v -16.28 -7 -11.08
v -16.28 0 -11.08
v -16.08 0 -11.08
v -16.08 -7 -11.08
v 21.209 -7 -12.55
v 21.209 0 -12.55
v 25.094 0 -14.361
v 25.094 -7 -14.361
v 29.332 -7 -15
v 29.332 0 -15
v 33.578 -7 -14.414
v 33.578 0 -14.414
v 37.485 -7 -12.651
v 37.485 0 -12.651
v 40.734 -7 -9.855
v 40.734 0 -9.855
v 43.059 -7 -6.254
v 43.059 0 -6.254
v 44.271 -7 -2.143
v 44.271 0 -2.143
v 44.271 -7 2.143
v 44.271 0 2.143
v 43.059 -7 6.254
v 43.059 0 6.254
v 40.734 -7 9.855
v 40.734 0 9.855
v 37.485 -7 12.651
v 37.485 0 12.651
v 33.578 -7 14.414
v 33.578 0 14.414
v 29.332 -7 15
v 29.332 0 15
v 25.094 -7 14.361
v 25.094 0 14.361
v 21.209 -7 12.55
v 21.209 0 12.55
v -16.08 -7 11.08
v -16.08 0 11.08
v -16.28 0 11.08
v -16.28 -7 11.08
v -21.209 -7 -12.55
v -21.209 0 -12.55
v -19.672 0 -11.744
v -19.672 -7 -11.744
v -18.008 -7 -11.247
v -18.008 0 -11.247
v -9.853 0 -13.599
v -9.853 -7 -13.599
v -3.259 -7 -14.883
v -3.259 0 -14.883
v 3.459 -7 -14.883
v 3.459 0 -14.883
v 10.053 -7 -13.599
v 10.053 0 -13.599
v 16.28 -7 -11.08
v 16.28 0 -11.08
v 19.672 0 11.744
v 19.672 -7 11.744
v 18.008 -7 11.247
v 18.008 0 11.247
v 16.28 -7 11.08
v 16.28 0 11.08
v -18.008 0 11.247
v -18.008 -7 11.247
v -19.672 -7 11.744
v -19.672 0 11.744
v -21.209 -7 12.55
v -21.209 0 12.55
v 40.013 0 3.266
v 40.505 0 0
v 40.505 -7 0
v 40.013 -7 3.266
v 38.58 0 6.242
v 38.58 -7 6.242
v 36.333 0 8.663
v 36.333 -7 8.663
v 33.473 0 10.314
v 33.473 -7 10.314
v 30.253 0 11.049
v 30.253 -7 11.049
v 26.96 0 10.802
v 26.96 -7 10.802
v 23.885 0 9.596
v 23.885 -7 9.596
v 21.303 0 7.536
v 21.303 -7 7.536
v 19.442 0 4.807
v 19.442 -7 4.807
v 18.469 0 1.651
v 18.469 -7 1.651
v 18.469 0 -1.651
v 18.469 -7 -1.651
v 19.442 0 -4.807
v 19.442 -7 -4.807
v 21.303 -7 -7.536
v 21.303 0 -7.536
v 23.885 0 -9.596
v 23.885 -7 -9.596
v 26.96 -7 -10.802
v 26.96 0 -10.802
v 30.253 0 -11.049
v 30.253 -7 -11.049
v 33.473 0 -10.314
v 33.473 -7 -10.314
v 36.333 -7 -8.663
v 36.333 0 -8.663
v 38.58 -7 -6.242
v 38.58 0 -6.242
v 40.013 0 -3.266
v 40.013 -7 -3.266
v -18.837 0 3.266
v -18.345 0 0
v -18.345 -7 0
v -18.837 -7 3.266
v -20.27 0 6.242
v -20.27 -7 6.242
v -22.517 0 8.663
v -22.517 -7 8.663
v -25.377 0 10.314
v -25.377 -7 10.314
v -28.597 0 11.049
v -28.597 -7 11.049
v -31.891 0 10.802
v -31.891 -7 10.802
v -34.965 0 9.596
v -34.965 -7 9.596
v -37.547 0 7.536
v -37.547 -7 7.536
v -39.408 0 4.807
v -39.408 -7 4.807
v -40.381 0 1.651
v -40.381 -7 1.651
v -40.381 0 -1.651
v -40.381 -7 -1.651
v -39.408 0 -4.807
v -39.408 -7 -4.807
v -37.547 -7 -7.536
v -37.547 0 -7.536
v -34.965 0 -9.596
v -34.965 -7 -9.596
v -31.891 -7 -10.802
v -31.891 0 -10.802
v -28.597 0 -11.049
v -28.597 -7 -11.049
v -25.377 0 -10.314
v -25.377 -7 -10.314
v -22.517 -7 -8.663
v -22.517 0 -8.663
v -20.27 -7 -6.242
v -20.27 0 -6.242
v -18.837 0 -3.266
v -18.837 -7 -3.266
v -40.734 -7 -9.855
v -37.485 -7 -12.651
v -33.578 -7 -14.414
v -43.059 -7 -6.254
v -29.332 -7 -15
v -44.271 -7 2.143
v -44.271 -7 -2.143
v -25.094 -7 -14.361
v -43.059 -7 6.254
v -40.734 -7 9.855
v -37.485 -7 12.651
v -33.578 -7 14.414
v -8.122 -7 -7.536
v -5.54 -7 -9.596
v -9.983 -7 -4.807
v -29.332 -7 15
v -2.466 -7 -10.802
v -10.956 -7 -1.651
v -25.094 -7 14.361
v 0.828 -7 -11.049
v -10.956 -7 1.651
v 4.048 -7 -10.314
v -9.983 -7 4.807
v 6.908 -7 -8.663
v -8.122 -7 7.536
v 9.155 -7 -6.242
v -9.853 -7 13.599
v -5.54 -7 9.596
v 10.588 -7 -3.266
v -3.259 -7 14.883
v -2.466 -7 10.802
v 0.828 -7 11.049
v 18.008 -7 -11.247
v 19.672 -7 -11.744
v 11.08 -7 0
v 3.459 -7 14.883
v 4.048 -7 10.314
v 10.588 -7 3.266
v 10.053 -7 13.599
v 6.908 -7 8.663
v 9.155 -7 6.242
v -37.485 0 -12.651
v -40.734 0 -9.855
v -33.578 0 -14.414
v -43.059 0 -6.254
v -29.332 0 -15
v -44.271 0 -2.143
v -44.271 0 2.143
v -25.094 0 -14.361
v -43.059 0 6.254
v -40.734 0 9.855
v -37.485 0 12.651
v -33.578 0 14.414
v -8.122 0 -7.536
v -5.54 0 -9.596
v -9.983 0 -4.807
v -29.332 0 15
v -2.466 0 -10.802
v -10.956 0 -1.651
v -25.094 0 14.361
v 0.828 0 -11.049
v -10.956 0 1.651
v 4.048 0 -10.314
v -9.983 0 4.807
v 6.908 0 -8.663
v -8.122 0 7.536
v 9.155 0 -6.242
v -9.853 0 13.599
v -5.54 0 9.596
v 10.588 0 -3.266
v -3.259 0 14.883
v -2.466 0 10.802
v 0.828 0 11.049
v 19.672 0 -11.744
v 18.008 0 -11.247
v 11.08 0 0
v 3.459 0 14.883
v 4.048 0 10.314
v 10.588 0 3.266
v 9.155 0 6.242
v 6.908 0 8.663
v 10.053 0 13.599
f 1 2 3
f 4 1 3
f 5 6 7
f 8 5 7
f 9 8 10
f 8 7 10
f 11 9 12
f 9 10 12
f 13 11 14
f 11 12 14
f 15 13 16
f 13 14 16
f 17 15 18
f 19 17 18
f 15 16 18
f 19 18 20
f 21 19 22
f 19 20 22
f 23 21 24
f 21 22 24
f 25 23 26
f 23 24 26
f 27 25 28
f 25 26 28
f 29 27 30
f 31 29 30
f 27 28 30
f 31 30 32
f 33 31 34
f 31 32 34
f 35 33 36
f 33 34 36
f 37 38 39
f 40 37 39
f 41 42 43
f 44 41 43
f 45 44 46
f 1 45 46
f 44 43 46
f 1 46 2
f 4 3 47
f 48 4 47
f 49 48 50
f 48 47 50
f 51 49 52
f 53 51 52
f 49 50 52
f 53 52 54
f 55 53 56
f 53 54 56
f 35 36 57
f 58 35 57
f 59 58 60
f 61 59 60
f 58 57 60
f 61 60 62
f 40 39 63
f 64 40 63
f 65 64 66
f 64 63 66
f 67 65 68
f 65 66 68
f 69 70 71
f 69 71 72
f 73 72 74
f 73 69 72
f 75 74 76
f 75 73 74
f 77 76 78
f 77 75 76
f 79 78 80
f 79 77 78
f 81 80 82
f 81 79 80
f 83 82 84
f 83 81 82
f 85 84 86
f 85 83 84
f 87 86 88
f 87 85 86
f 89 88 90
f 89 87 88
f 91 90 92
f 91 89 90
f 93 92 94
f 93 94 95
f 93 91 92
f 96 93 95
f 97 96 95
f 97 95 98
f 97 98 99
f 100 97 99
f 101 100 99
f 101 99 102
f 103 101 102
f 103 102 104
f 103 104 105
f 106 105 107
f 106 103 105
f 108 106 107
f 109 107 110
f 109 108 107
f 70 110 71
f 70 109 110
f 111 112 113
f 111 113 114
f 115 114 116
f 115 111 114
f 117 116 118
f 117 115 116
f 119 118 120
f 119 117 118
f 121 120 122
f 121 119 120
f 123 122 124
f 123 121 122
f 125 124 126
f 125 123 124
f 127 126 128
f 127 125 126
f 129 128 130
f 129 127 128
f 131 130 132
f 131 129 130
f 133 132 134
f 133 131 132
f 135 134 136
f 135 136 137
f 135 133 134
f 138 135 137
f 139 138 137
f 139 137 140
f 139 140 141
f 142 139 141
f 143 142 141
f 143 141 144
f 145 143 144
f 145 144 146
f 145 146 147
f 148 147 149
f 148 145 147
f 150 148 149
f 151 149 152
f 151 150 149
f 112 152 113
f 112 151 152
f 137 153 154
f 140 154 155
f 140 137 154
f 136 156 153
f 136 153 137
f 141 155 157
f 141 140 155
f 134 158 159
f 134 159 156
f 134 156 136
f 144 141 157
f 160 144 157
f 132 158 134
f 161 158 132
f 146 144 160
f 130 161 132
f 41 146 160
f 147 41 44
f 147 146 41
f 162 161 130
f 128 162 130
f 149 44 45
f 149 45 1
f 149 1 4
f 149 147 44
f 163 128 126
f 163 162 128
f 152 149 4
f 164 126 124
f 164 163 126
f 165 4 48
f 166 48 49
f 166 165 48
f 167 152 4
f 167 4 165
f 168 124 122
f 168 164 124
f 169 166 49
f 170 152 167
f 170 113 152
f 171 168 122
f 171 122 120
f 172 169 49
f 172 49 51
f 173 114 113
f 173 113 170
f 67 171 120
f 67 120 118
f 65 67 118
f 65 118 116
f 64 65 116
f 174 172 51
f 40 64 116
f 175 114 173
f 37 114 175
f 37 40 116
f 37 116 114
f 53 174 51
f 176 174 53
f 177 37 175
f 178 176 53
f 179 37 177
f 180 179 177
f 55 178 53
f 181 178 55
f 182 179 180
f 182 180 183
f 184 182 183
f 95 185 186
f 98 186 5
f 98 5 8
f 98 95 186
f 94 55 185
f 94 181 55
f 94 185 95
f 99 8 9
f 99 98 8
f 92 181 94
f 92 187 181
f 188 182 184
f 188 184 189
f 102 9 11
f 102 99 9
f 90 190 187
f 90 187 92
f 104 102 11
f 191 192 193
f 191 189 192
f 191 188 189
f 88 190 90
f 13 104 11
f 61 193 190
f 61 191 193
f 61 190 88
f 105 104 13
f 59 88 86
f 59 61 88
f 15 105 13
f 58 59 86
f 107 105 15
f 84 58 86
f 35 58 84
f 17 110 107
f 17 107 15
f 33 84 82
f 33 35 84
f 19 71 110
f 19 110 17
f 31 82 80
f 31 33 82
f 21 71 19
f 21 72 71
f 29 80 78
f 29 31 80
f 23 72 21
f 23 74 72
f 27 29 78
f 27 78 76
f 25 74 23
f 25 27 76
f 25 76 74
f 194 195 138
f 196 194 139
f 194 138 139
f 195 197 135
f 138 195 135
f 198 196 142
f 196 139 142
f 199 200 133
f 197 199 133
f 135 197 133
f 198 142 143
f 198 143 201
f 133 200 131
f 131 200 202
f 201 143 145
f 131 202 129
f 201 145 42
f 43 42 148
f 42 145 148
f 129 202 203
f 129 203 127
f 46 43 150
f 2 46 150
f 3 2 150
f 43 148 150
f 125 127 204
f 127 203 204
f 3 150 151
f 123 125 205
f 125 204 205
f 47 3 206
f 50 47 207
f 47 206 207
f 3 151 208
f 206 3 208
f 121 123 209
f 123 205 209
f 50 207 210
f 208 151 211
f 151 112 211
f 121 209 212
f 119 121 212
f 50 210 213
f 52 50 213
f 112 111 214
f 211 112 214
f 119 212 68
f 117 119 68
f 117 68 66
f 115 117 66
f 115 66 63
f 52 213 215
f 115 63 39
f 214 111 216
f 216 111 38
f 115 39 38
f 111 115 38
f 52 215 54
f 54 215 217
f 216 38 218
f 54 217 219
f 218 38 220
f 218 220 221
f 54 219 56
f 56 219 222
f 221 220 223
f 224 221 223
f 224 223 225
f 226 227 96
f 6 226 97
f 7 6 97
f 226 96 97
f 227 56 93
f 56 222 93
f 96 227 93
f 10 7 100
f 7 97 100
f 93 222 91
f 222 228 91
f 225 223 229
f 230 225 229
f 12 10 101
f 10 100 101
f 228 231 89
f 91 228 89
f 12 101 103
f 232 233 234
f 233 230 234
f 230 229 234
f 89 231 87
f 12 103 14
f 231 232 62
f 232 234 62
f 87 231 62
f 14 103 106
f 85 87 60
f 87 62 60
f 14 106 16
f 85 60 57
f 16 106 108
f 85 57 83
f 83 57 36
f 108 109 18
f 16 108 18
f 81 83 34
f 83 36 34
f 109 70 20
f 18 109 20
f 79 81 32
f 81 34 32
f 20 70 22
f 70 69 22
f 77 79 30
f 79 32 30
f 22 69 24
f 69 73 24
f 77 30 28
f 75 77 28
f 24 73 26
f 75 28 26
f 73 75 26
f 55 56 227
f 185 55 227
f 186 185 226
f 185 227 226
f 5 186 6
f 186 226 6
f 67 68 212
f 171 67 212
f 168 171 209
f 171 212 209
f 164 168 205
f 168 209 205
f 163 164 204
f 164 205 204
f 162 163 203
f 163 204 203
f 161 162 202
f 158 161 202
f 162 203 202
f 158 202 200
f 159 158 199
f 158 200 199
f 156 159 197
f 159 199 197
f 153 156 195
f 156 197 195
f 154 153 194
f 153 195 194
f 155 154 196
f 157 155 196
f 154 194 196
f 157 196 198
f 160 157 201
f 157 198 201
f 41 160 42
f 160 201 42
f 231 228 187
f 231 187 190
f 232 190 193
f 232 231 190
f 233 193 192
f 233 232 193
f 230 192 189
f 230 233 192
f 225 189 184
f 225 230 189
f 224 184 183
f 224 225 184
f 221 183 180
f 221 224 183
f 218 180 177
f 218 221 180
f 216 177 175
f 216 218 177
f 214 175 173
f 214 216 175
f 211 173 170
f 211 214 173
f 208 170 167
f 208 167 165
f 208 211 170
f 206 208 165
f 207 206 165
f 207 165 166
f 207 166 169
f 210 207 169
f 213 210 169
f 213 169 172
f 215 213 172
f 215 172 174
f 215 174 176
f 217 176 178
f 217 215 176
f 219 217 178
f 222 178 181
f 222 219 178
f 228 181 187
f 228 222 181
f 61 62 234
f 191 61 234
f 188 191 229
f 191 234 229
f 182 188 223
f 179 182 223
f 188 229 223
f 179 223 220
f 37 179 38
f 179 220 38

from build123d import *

# Parameters (mm, degrees)
F0_R     = 11.08
F1_DEPTH = 7


with BuildPart() as f1:
    # F0 (on Front) → F1 (new body)
    with BuildSketch(Plane.XZ):
        with BuildLine():
            ThreePointArc((16.28, 11.08), (0.1, 15.044414), (-16.08, 11.08))
            Line((-16.08, 11.08), (-16.28, 11.08))
            ThreePointArc((-16.28, 11.08), (-18.851964, 11.455326), (-21.209412, 12.55))
            ThreePointArc((-21.209412, 12.55), (-44.425098, 0), (-21.209412, -12.55))
            ThreePointArc((-21.209412, -12.55), (-18.851964, -11.455326), (-16.28, -11.08))
            Line((-16.28, -11.08), (-16.08, -11.08))
            ThreePointArc((-16.08, -11.08), (0.1, -15.044414), (16.28, -11.08))
            ThreePointArc((16.28, -11.08), (18.851964, -11.455326), (21.209412, -12.55))
            ThreePointArc((21.209412, -12.55), (44.425098, 0), (21.209412, 12.55))
            ThreePointArc((21.209412, 12.55), (18.851964, 11.455326), (16.28, 11.08))
        make_face()
        with Locations((-29.425098, 0)):
            Circle(F0_R, mode=Mode.SUBTRACT)
        Circle(F0_R, mode=Mode.SUBTRACT)
        with Locations((29.425098, 0)):
            Circle(F0_R, mode=Mode.SUBTRACT)
    extrude(amount=F1_DEPTH)


solid = f1.part
